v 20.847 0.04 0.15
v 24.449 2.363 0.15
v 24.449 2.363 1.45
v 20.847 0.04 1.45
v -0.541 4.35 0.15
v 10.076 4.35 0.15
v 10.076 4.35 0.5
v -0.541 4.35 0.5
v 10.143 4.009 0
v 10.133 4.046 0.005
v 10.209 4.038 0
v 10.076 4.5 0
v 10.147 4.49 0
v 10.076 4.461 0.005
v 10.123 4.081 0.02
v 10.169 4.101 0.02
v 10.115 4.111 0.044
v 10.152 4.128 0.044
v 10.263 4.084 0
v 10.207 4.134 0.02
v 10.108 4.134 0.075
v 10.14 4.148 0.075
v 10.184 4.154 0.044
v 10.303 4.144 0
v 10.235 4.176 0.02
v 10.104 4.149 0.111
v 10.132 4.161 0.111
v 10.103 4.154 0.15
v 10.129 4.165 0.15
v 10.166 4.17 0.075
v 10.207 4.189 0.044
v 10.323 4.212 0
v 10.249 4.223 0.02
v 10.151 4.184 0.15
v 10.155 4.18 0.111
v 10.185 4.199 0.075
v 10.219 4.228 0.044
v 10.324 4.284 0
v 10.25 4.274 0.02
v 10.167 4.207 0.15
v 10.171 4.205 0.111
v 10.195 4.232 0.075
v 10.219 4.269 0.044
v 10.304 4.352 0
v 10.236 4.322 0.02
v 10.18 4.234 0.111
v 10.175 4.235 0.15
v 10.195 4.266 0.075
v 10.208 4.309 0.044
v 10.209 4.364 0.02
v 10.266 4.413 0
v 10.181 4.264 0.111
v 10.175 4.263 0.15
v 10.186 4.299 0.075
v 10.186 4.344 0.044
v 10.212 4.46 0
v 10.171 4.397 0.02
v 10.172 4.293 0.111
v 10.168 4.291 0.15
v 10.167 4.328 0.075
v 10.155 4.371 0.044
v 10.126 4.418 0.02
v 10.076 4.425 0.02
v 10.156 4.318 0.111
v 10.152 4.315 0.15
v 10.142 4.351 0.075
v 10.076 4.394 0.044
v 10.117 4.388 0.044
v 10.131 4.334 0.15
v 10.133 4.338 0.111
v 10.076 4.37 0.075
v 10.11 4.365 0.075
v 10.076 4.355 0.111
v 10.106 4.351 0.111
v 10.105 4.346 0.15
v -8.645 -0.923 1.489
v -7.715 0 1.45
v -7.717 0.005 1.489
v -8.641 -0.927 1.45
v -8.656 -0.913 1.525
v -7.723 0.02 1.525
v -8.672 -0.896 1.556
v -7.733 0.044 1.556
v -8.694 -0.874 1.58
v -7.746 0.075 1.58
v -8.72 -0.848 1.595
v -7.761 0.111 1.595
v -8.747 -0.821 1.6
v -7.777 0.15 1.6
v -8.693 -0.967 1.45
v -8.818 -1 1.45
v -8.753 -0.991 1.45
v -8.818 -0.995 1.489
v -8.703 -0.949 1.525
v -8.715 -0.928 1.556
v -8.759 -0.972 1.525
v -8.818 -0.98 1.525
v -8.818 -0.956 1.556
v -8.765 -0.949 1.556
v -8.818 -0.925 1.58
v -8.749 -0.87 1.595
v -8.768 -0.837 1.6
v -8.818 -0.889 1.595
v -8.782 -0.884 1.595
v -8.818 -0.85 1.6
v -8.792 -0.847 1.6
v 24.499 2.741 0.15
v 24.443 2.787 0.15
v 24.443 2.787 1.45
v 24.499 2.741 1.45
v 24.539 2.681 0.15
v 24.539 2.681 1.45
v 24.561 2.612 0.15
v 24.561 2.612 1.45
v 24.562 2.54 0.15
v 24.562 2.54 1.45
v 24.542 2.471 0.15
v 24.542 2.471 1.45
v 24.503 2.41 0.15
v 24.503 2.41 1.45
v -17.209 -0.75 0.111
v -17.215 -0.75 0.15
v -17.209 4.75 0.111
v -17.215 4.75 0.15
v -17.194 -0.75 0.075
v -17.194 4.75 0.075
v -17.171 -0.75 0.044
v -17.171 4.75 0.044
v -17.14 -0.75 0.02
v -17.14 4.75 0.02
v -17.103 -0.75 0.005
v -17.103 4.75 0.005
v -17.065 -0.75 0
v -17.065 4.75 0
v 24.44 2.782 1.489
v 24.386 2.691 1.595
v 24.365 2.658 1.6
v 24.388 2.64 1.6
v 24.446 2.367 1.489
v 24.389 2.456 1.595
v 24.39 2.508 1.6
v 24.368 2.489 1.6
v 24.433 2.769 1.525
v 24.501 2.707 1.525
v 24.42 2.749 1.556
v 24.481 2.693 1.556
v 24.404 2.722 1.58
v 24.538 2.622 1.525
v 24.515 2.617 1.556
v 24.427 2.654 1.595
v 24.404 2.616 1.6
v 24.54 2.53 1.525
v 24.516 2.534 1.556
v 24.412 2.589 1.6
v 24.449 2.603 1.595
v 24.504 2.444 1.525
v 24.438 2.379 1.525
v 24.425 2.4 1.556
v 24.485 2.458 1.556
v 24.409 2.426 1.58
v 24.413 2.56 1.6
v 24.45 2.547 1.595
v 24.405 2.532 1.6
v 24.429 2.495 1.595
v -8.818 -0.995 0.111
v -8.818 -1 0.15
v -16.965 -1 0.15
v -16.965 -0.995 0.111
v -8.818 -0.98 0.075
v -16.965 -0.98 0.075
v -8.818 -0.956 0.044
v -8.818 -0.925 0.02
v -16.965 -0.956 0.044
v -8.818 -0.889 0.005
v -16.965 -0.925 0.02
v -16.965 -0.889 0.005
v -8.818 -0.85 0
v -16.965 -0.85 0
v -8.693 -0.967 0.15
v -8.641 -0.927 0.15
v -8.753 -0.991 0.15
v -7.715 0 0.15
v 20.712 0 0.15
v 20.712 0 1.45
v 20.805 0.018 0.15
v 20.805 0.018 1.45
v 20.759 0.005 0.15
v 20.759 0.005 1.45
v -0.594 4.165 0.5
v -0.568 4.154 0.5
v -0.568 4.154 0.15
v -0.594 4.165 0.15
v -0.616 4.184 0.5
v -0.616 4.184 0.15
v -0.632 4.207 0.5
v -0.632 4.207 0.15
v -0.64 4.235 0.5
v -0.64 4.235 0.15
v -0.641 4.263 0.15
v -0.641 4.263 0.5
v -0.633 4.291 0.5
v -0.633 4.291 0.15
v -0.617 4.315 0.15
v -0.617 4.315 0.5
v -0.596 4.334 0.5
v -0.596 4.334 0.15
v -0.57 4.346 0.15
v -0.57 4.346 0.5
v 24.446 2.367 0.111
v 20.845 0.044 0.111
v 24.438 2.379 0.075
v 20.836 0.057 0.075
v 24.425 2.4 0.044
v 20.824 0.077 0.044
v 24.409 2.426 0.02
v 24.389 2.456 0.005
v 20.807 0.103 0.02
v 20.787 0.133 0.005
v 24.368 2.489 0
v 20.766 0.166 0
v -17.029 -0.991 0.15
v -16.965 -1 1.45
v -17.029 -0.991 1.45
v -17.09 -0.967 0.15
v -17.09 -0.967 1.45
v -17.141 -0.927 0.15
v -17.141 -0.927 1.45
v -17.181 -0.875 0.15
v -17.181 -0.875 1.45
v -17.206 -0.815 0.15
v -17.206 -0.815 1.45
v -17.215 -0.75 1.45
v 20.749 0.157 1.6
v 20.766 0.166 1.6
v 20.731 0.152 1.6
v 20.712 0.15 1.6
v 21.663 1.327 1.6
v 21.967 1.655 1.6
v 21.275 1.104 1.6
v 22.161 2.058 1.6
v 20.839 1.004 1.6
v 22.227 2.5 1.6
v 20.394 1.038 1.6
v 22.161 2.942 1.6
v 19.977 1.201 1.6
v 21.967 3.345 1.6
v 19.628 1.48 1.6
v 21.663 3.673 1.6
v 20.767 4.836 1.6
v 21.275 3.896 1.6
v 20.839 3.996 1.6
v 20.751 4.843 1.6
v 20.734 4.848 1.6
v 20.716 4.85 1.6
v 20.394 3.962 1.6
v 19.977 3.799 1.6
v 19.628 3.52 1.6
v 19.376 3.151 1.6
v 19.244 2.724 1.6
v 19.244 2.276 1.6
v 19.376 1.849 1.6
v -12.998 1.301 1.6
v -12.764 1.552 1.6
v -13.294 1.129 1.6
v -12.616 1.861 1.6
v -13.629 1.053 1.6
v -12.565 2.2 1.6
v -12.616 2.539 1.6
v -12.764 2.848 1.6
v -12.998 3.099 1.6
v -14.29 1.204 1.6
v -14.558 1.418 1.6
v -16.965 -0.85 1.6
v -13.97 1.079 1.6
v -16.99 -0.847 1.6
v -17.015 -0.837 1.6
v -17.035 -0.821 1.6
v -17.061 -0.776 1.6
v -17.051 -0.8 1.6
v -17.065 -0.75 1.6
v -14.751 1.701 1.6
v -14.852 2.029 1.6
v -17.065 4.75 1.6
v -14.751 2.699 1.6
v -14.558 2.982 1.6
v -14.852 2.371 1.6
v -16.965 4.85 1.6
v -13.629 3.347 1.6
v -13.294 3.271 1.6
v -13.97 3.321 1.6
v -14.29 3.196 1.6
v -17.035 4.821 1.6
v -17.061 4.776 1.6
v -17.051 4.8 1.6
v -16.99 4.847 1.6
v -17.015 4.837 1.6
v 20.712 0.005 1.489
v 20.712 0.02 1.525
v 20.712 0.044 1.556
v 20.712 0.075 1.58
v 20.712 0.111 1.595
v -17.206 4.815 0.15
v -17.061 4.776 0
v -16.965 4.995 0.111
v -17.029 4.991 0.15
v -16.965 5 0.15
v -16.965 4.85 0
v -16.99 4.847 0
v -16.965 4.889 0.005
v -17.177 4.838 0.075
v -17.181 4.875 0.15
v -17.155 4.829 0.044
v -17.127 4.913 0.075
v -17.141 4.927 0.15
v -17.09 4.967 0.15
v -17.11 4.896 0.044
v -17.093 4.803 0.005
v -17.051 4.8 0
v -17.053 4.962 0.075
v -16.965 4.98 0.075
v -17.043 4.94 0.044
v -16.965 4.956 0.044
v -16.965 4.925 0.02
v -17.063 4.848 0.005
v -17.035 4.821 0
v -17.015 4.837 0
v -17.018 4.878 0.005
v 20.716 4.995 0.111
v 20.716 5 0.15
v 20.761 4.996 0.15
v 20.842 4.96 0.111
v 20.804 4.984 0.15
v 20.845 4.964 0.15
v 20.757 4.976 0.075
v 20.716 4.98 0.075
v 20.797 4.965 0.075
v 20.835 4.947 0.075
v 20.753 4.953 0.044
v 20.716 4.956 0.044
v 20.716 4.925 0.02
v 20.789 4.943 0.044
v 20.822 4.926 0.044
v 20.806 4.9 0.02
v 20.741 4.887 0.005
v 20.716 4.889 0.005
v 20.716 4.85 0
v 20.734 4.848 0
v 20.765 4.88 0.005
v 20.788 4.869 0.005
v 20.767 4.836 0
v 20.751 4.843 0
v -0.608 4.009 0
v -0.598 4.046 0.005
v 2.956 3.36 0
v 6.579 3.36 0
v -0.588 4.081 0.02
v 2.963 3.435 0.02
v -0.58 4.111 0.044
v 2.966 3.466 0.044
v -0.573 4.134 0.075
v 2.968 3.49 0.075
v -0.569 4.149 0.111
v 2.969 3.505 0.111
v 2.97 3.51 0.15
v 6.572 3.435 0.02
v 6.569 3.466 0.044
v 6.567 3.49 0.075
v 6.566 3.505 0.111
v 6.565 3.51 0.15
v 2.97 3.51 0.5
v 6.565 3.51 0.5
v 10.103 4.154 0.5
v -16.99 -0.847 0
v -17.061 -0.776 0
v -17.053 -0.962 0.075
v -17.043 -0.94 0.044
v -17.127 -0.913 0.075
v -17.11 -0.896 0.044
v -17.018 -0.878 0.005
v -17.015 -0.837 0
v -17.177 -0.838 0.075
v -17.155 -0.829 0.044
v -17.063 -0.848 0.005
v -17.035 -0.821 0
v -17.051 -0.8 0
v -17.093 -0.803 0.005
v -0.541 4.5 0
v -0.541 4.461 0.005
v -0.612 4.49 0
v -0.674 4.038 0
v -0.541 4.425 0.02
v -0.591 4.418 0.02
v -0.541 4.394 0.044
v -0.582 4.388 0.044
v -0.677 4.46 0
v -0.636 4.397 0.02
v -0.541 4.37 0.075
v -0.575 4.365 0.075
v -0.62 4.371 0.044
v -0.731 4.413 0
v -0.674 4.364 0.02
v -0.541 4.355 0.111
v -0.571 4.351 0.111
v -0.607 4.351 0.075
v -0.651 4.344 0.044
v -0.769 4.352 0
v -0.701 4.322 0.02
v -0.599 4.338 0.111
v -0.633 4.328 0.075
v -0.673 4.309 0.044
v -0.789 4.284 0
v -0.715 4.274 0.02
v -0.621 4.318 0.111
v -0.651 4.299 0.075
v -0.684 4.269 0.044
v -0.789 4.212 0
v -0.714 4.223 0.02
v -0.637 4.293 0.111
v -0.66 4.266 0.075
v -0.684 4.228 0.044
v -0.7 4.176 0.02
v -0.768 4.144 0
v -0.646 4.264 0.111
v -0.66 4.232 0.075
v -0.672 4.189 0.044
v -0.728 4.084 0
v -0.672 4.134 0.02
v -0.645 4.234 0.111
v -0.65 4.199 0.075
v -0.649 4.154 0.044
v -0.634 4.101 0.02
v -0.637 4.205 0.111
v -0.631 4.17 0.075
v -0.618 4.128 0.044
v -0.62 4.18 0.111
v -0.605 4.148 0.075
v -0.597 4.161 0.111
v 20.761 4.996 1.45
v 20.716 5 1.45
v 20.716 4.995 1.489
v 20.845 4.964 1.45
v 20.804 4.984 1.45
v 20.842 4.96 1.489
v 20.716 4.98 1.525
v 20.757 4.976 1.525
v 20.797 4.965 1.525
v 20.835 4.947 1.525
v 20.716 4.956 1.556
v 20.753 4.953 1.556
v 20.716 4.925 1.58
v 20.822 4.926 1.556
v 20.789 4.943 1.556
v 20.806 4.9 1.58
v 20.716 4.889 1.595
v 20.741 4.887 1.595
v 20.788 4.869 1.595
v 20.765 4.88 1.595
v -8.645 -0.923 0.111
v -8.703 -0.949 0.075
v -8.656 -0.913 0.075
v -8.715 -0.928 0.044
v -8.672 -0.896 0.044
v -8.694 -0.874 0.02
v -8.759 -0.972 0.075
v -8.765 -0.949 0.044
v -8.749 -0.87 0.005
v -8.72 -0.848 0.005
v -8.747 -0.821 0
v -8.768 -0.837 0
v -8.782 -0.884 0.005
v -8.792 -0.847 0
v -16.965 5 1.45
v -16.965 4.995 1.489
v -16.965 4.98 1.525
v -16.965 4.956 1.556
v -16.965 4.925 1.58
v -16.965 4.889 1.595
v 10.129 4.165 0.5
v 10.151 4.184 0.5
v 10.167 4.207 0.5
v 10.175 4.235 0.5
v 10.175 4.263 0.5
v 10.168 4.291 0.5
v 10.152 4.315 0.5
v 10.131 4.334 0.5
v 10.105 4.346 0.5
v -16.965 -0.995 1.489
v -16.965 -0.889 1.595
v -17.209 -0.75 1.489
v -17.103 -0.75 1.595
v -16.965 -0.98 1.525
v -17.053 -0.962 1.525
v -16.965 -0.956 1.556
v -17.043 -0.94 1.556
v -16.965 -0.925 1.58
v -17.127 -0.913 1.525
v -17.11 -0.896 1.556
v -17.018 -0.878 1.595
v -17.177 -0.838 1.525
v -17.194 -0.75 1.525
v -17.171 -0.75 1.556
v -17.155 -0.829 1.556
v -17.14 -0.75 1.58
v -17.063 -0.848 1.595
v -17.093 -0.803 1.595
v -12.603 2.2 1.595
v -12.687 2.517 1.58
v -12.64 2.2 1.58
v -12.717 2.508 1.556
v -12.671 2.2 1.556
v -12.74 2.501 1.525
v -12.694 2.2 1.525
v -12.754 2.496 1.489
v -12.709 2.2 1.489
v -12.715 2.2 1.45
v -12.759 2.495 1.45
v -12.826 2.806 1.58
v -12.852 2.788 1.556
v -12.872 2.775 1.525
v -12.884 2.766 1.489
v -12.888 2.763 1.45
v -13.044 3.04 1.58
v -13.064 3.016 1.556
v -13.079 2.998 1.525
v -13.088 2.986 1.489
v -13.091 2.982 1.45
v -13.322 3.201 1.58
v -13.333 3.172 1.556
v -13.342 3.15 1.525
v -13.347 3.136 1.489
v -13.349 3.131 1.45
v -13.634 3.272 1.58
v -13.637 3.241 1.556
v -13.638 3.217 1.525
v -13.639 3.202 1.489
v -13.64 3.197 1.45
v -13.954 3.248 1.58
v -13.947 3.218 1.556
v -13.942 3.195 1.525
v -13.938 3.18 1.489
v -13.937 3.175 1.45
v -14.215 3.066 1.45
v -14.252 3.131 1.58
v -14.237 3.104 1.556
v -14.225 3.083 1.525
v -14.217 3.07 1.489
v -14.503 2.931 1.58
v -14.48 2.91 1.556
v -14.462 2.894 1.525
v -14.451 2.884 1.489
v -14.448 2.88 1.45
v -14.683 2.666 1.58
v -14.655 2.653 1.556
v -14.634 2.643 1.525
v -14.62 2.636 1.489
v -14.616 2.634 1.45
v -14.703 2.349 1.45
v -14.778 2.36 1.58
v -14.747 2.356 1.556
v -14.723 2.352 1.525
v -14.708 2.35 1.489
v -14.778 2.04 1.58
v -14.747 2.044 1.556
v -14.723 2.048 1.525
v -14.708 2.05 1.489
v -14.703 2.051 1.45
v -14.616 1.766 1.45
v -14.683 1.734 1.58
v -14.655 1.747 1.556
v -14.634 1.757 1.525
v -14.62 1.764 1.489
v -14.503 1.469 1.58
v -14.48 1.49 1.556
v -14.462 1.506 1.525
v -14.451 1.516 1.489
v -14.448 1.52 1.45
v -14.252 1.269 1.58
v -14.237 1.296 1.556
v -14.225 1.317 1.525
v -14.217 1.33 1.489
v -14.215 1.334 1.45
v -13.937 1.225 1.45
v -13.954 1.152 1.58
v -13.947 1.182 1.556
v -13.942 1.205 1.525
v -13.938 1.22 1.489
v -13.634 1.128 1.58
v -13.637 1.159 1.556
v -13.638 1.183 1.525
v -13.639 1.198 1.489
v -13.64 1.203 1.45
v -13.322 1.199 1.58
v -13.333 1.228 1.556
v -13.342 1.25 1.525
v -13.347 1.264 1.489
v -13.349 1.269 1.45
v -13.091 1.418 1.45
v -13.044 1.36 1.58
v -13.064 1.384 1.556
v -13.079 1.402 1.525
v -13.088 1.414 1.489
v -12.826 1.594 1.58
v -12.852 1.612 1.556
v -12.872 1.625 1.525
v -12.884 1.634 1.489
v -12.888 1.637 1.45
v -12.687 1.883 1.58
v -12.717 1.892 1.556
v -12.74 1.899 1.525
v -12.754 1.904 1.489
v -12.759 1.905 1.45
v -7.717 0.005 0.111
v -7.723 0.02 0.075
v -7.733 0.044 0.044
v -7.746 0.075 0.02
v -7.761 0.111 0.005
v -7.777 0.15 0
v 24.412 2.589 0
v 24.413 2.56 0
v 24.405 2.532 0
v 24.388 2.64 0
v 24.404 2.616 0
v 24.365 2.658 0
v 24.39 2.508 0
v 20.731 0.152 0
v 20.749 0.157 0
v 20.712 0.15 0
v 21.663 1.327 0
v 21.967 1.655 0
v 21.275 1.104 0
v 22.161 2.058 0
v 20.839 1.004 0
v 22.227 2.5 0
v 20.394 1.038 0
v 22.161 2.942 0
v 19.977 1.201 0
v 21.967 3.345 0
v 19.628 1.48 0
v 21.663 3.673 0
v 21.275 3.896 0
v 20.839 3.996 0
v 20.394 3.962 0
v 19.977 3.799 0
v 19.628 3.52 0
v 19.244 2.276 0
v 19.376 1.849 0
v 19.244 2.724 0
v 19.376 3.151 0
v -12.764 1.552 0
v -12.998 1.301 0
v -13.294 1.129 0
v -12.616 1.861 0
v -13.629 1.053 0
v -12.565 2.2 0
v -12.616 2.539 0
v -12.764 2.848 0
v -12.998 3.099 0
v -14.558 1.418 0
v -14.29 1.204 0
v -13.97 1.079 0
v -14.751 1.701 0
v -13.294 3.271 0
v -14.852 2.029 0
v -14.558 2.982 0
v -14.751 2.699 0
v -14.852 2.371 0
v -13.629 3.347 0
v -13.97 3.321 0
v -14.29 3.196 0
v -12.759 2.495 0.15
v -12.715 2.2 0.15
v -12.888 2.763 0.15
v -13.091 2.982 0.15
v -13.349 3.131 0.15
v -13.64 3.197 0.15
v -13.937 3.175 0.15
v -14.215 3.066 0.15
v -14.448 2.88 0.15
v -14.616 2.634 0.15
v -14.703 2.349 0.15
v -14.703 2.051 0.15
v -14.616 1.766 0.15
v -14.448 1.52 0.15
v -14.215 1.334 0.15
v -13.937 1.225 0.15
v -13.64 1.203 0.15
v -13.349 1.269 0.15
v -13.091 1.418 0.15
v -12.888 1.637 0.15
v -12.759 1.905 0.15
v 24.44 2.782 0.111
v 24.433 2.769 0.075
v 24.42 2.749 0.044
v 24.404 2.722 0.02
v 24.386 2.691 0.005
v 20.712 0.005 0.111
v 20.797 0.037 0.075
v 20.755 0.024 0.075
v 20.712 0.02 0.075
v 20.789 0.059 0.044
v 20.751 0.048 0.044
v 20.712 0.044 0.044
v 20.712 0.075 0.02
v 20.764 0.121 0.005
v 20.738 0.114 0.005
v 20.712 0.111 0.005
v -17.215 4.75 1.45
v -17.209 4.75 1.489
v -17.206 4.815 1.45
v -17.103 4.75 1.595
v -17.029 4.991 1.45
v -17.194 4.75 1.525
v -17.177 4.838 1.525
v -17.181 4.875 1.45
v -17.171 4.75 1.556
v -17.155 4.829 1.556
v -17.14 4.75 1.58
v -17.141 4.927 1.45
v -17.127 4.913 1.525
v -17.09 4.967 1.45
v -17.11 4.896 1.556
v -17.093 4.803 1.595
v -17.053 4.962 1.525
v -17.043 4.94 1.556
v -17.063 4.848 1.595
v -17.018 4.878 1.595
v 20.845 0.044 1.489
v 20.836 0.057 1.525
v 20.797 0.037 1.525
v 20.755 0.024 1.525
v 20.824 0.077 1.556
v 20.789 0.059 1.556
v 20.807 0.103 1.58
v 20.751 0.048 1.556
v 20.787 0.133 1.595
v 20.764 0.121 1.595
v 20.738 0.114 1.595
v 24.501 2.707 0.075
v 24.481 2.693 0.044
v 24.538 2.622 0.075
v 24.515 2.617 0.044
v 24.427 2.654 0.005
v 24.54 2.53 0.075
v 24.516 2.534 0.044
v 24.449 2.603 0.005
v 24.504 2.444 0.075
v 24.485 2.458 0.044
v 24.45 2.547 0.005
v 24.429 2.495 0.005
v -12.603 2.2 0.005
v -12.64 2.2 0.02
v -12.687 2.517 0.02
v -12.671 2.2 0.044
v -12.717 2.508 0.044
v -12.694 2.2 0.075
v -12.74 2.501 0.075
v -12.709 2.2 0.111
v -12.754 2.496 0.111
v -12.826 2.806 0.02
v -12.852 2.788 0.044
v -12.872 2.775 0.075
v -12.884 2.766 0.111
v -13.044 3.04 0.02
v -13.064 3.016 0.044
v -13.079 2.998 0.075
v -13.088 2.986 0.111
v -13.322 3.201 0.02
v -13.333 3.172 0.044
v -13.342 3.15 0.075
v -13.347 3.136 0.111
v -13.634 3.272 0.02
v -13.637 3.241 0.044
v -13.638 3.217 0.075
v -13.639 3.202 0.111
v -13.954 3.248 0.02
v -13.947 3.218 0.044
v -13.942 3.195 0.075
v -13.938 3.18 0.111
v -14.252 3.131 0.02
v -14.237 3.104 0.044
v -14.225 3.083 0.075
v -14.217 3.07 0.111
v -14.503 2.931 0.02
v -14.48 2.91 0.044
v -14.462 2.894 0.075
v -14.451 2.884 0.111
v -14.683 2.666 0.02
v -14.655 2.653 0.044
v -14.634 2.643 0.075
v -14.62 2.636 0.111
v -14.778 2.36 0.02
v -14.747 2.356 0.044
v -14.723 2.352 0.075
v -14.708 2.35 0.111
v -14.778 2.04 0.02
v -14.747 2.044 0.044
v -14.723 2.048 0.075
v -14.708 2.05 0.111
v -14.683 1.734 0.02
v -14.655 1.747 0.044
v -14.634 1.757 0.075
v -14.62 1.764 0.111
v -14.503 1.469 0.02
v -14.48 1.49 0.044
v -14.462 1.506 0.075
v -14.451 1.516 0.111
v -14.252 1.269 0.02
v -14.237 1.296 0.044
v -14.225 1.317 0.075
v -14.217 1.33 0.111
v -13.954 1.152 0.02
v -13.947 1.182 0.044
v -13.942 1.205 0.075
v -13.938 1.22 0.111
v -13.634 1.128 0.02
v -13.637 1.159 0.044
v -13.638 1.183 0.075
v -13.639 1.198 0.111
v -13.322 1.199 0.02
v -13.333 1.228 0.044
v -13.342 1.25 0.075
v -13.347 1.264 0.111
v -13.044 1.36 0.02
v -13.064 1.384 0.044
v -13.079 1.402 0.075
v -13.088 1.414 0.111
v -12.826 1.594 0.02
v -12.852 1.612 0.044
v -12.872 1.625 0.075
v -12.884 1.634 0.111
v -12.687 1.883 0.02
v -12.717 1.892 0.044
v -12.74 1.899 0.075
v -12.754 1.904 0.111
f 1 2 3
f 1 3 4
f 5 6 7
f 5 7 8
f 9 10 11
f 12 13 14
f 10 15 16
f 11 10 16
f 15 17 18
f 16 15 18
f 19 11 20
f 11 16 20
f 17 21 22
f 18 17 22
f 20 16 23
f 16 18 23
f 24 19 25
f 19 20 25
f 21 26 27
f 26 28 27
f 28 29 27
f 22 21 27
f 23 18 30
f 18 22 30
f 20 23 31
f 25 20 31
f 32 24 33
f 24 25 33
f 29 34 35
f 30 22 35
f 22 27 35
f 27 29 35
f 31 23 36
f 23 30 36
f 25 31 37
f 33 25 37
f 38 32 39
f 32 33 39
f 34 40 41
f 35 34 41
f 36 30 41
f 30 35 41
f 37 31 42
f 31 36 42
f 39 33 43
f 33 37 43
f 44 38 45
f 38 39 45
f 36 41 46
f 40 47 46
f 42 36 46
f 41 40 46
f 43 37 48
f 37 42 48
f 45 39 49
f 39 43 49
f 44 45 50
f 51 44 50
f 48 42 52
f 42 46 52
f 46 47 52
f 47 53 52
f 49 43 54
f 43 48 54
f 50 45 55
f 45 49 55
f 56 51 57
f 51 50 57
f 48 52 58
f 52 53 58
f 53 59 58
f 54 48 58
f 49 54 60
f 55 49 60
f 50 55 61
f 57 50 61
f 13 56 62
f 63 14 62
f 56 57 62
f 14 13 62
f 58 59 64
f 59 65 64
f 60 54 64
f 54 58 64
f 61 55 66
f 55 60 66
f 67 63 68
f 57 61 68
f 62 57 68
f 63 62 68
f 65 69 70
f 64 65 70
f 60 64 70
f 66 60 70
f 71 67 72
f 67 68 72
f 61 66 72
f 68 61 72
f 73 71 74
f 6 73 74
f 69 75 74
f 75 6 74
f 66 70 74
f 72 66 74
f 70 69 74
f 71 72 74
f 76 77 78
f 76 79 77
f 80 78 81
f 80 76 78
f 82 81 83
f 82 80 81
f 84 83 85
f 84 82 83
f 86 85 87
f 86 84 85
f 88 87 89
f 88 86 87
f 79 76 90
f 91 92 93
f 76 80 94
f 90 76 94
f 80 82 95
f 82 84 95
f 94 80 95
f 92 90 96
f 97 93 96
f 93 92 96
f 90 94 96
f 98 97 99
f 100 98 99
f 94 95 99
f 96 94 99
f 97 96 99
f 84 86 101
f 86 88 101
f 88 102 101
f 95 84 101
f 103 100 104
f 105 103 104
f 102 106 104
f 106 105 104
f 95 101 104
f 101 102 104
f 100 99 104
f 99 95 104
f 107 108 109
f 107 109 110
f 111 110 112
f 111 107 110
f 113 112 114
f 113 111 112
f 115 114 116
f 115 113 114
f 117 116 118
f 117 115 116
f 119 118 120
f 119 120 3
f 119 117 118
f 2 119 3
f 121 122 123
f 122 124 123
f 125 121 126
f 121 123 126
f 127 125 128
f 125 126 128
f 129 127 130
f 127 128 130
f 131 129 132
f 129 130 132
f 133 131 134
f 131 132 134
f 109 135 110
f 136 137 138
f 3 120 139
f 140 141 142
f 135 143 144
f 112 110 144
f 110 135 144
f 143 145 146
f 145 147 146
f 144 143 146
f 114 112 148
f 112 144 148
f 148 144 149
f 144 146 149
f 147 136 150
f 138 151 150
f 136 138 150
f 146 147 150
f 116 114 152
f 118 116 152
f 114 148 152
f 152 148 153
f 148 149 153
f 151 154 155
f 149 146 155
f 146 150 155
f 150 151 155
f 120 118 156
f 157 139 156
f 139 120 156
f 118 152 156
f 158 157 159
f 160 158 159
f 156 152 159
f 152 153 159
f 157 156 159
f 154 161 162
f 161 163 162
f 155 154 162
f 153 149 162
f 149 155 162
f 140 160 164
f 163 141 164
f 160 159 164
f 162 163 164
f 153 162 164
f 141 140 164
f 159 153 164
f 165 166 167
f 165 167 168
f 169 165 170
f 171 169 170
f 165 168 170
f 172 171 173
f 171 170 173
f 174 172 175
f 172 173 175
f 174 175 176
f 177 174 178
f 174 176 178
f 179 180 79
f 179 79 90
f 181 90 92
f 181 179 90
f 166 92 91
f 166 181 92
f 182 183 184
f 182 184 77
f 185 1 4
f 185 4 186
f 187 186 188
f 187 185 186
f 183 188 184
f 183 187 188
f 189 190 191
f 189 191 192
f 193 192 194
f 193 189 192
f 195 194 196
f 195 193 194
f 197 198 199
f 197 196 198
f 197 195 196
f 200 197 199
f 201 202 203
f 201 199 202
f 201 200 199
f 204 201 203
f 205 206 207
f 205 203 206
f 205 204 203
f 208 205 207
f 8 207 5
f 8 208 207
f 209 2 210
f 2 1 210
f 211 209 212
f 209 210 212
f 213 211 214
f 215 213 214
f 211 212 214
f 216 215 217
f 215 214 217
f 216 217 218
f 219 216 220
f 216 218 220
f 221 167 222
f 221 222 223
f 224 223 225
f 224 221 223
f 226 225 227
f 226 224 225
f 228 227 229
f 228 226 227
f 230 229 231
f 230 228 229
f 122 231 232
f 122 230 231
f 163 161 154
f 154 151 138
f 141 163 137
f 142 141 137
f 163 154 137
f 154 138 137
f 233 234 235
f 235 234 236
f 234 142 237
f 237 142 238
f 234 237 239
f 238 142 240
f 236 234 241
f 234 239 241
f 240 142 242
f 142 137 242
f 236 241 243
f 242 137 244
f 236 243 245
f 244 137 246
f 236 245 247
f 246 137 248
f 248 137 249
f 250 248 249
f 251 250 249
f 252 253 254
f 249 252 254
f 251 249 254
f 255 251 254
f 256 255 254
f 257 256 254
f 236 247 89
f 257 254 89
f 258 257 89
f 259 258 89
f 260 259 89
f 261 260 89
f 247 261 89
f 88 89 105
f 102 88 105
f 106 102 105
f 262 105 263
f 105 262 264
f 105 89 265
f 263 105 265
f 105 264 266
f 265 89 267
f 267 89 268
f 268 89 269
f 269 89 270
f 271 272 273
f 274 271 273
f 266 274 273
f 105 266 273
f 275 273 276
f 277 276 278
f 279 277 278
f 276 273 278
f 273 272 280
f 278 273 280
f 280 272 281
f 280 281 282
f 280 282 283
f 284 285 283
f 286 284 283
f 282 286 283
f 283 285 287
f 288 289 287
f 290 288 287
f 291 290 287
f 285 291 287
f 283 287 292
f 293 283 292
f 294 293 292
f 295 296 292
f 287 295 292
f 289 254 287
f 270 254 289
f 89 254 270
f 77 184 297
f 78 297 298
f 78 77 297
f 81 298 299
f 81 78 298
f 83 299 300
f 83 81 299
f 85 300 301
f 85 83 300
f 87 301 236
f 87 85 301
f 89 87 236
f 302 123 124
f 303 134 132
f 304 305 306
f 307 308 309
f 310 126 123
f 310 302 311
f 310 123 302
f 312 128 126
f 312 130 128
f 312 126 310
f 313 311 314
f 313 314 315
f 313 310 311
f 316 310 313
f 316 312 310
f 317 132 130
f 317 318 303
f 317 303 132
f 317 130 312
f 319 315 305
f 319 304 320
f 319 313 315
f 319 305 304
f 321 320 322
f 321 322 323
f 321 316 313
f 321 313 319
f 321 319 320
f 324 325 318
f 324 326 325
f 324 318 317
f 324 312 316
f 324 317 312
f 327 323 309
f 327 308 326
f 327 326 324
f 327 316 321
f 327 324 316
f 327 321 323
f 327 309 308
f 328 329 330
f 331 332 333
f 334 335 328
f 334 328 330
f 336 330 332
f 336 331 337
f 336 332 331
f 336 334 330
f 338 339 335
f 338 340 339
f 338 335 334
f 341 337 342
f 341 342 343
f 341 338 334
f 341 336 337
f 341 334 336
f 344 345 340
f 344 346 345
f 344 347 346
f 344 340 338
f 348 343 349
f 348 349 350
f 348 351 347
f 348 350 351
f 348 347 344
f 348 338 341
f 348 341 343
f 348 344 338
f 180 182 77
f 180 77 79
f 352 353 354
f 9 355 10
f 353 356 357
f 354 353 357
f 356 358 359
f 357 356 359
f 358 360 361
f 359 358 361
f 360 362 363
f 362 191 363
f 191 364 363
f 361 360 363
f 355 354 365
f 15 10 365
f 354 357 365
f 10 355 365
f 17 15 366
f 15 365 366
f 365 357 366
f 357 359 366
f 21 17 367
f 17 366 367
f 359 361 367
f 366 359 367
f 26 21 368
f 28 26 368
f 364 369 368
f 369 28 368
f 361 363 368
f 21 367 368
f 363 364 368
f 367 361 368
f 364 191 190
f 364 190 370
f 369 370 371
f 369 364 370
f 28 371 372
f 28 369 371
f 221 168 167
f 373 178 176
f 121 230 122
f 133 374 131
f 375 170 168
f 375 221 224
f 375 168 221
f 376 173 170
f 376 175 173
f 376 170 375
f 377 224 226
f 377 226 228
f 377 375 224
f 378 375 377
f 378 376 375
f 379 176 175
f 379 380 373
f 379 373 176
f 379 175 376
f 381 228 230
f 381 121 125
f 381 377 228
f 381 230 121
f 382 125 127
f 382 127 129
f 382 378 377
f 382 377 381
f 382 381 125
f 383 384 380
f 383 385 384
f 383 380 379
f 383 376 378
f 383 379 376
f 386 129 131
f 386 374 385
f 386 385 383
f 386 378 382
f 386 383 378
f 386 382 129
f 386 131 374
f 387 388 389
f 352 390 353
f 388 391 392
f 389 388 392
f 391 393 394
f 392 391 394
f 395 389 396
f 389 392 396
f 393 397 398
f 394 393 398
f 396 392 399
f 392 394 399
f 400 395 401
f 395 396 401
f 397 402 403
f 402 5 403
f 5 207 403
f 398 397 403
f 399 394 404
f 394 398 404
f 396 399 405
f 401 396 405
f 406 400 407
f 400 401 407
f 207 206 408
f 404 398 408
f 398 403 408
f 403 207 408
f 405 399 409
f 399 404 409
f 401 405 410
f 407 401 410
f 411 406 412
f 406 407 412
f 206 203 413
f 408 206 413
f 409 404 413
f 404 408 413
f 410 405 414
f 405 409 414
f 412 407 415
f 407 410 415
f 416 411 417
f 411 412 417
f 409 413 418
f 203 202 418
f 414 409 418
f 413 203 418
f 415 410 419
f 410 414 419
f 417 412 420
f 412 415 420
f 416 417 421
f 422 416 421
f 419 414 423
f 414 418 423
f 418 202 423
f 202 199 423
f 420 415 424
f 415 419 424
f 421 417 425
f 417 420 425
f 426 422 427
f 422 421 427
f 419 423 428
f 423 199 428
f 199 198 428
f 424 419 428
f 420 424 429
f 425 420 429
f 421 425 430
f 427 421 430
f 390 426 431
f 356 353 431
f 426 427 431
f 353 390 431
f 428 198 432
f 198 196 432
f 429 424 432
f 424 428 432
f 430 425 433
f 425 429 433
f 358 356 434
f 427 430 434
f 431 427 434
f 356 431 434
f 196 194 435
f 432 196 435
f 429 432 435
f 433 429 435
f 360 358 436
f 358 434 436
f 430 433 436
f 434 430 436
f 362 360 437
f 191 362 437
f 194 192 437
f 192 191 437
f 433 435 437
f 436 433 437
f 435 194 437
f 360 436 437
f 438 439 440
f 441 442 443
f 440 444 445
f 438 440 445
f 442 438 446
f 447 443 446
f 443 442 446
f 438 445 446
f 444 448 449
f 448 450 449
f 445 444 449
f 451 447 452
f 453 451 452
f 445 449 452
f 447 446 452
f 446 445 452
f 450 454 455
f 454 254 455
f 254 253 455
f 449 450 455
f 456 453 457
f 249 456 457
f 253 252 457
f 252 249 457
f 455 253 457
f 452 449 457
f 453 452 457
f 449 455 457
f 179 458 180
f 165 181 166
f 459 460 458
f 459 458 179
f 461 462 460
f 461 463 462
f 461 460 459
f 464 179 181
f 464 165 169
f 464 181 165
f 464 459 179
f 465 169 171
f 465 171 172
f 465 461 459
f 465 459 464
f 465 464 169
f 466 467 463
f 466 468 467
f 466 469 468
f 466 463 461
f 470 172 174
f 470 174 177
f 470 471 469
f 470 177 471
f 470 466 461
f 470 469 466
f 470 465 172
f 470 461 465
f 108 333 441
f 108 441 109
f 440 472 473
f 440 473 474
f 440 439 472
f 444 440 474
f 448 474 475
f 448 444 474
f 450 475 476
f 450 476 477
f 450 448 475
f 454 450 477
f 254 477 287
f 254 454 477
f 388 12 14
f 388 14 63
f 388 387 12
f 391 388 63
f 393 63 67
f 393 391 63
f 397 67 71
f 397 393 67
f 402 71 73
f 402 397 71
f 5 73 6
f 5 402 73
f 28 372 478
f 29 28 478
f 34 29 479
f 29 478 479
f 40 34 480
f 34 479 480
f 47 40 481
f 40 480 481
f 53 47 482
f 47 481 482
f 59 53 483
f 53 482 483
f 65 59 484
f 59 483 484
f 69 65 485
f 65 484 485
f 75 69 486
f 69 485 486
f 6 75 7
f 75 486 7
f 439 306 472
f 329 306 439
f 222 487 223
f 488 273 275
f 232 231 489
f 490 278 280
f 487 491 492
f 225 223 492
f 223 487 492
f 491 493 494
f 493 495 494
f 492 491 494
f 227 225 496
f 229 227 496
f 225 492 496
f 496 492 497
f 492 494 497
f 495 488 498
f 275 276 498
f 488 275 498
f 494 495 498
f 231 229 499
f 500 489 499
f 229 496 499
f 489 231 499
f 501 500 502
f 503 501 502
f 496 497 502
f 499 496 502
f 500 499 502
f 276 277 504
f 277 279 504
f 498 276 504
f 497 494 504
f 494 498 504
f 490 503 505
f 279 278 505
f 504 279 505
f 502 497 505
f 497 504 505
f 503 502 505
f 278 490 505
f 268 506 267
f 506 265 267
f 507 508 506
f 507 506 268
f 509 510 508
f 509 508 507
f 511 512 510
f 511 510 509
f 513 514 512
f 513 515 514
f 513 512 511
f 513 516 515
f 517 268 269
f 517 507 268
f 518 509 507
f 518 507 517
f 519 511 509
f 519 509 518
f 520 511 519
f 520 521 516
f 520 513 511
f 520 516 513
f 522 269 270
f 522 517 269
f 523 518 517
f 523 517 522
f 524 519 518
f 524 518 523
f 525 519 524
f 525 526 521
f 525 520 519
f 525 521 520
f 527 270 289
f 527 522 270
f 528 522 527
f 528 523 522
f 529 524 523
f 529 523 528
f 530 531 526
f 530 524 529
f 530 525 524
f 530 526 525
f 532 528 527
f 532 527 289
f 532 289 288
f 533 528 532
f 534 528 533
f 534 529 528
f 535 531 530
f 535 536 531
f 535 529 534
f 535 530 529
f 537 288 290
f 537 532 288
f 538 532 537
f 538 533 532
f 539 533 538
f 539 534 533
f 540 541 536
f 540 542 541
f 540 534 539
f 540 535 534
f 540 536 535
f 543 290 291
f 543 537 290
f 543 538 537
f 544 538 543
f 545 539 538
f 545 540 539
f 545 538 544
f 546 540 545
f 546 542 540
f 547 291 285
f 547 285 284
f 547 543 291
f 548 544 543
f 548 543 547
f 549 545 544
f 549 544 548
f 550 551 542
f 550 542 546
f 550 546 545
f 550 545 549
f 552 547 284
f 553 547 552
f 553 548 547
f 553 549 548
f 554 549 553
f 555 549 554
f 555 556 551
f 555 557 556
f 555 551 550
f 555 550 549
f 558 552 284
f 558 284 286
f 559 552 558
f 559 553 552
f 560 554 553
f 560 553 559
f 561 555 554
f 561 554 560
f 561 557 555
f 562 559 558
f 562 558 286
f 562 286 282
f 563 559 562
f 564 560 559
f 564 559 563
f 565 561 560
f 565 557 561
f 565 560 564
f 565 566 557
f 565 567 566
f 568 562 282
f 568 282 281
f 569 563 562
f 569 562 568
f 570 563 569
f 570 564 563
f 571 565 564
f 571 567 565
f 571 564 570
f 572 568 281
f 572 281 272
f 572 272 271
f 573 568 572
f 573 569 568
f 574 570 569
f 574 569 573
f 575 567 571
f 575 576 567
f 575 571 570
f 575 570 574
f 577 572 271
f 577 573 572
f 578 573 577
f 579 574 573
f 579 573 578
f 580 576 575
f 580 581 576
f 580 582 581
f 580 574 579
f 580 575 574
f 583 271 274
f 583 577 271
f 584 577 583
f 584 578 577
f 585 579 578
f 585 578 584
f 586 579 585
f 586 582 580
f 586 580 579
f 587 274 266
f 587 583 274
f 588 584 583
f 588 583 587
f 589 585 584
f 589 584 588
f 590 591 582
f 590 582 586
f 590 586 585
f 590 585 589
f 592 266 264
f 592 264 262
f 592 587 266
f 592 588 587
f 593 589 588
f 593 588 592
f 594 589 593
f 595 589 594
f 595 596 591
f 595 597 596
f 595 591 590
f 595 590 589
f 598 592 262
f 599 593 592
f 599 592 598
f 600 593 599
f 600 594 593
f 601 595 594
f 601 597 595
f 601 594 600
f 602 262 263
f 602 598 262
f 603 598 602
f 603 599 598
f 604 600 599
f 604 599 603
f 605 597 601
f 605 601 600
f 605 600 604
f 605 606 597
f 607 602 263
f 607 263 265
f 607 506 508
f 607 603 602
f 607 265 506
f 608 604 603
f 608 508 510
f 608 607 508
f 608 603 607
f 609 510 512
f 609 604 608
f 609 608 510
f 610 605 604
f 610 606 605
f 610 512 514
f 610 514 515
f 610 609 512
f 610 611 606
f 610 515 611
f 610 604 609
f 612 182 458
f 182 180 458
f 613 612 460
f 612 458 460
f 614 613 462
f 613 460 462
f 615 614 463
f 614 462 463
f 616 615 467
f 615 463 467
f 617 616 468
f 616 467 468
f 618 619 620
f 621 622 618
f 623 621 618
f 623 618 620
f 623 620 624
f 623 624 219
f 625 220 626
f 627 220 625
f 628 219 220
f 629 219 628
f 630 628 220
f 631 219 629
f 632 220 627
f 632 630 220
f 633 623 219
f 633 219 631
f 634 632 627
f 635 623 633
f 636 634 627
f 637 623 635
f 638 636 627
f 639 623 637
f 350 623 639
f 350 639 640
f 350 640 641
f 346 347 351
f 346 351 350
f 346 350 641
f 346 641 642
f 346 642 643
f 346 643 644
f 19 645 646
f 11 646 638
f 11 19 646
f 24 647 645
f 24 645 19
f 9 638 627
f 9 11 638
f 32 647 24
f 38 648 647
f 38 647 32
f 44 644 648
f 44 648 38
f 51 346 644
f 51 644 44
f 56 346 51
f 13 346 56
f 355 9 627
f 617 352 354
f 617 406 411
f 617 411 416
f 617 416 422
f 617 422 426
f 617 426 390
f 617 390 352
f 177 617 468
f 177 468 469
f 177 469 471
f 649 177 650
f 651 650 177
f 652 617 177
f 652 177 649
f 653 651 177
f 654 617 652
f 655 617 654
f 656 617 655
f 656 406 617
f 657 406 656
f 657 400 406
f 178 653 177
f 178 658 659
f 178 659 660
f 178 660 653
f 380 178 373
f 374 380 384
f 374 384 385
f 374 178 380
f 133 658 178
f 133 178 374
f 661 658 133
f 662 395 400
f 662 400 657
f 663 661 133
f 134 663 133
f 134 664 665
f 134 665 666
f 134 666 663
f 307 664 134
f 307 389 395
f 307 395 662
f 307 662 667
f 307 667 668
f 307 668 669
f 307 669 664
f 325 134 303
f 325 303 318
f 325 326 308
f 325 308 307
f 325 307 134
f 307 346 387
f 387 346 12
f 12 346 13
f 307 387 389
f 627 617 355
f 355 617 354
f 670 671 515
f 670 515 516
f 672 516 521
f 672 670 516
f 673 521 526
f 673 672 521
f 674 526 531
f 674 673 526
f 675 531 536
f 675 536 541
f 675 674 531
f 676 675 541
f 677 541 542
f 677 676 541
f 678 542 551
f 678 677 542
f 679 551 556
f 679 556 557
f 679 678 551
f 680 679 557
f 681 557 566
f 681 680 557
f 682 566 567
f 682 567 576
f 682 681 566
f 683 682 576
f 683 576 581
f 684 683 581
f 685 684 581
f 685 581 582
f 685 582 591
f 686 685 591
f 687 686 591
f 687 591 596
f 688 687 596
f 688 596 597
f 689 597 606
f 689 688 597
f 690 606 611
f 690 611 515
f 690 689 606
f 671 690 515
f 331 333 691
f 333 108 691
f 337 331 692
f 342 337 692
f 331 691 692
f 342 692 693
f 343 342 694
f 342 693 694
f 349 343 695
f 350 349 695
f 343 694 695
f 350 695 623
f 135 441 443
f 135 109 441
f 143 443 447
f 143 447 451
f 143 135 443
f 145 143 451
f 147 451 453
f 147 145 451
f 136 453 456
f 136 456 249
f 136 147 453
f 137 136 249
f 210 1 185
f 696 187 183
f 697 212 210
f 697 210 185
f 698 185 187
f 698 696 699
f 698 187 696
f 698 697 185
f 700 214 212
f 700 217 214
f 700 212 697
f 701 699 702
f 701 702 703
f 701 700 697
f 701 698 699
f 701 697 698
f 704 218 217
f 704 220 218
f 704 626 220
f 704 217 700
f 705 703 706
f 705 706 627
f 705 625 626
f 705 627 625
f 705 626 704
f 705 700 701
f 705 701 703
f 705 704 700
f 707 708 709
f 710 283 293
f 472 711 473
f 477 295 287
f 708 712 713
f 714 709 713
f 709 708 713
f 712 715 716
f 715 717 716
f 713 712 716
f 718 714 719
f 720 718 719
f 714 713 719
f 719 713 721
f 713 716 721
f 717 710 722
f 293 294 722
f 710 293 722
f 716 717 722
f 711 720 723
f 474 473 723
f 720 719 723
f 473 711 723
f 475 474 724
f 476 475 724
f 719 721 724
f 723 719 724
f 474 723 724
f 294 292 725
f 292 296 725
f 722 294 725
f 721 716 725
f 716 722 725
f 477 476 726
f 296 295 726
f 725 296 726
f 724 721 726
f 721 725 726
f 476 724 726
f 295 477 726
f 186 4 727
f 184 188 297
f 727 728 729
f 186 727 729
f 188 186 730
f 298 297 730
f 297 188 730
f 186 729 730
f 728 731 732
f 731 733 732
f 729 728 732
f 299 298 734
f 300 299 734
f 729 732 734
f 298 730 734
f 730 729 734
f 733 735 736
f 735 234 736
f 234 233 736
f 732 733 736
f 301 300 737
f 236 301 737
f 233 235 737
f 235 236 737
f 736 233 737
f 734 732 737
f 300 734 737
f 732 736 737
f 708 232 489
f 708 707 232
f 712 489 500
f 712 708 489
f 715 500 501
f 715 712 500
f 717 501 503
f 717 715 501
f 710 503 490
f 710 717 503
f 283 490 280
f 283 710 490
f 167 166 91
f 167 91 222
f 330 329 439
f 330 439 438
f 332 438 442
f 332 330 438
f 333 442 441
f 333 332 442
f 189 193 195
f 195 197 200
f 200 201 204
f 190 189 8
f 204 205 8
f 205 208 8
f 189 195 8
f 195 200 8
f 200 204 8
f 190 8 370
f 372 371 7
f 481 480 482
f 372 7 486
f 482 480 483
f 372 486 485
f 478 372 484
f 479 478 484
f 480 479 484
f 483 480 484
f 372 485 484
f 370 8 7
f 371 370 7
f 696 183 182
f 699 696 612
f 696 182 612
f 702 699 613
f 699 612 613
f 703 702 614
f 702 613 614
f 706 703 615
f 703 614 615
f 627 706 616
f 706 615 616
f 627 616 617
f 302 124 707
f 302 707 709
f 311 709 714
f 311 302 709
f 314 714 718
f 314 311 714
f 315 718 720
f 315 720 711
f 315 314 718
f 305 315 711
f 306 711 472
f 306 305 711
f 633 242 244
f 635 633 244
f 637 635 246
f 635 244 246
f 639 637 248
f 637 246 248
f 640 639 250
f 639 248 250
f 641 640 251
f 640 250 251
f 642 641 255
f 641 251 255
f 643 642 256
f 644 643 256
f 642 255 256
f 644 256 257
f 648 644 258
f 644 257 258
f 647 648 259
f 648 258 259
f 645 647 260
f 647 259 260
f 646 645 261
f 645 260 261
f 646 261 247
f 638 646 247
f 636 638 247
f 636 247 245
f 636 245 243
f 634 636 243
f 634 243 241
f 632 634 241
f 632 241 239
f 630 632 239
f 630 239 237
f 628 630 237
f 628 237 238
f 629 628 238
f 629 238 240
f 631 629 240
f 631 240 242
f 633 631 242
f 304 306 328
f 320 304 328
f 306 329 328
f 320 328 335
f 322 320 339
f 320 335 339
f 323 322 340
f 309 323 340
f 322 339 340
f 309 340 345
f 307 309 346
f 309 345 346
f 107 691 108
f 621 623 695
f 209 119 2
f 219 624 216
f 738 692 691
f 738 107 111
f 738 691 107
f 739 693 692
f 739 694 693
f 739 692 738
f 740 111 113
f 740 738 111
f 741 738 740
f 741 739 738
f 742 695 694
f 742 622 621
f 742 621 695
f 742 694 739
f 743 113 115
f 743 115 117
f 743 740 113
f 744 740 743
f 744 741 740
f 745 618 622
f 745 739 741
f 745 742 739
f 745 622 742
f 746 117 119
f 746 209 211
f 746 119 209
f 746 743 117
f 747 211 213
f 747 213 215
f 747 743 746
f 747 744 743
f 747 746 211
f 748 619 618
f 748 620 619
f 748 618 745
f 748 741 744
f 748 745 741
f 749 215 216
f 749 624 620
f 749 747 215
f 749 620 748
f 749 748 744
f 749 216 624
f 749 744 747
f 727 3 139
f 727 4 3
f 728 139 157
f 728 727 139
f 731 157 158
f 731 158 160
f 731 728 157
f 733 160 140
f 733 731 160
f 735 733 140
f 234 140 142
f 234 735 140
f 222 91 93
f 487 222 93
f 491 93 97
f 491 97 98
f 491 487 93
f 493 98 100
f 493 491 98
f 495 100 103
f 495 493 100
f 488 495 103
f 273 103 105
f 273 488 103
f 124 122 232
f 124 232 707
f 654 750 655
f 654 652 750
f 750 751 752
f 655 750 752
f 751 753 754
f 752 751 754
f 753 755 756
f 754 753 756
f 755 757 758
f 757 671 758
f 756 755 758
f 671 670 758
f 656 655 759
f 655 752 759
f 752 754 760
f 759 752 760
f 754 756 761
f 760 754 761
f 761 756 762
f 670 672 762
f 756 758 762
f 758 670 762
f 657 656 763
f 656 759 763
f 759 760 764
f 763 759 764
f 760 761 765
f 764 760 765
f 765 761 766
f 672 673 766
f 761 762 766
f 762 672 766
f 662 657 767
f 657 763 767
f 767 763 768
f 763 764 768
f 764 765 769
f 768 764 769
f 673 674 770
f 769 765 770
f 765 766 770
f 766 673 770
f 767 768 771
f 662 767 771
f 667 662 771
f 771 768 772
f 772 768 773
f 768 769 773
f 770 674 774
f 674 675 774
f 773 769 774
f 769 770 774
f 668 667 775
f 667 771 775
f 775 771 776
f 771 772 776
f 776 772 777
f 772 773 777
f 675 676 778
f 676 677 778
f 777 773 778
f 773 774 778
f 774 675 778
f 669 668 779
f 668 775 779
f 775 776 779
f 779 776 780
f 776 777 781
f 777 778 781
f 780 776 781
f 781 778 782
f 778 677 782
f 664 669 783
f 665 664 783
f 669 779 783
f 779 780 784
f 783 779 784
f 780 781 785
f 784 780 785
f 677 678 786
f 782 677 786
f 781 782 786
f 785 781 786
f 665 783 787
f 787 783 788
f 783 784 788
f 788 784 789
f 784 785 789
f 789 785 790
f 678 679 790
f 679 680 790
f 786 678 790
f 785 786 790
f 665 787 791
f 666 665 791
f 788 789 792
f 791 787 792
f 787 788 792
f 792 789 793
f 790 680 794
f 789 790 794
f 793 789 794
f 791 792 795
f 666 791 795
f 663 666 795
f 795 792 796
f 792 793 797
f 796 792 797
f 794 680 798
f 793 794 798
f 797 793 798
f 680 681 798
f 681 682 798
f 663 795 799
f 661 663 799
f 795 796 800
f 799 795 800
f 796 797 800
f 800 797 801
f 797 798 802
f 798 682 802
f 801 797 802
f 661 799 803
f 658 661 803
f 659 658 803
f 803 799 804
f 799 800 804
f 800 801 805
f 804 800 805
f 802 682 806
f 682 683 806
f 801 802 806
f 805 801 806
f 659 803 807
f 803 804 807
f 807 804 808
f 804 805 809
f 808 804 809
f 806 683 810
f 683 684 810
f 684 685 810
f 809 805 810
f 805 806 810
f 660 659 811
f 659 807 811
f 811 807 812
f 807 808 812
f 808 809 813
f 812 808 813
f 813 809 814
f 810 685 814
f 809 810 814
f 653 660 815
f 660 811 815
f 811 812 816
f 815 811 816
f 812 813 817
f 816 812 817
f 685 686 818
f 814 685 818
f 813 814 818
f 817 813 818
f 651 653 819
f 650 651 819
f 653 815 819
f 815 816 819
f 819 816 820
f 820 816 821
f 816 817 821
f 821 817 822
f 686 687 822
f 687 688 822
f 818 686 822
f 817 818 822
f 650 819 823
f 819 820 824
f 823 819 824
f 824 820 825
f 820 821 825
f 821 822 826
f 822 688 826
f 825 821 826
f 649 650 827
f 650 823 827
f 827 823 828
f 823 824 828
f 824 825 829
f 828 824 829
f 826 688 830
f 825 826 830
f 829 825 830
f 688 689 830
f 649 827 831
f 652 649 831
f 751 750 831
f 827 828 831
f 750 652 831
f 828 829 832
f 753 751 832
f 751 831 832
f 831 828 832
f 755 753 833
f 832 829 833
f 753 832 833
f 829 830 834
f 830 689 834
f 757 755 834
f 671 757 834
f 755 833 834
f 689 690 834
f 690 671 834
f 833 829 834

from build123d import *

# Parameters (mm, degrees)
SKETCH1_R           = 1
BOSS_EXTRUDE1_DEPTH = 1.6
FILLET1_R           = 0.15
SKETCH2_R           = 1.5
CUT_EXTRUDE1_DEPTH  = 26.118429106
FILLET2_R           = 0.15
CUT_EXTRUDE2_DEPTH  = 0.5
FILLET3_R           = 0.1
FILLET4_R           = 0.15


with BuildPart() as part:
    # Sketch1 → Boss-Extrude1 (new body)
    with BuildSketch(Plane.XY):
        with BuildLine():
            Line((20.711831818, 0), (-7.714550435, 0))
            Line((-7.714550435, 0), (-8.64132713, -0.926776695))
            ThreePointArc((-8.64132713, -0.926776695), (-8.722432968, -0.980969883), (-8.818103826, -1))
            Line((-8.818103826, -1), (-16.964550435, -1))
            ThreePointArc((-16.964550435, -1), (-17.14132713, -0.926776695), (-17.214550435, -0.75))
            Line((-17.214550435, -0.75), (-17.214550435, 4.75))
            ThreePointArc((-17.214550435, 4.75), (-17.14132713, 4.926776695), (-16.964550435, 5))
            Line((-16.964550435, 5), (20.715695772, 5))
            ThreePointArc((20.715695772, 5), (20.782883317, 4.990802479), (20.845127191, 4.96388667))
            Line((20.845127191, 4.96388667), (24.443133824, 2.786588264))
            ThreePointArc((24.443133824, 2.786588264), (24.56367691, 2.576271817), (24.449189394, 2.362598581))
            Line((24.449189394, 2.362598581), (20.847318807, 0.039896988))
            ThreePointArc((20.847318807, 0.039896988), (20.782451386, 0.010181576), (20.711831818, 0))
        make_face()
        with Locations((-13.714550435, 2.2)):
            Circle(SKETCH1_R, mode=Mode.SUBTRACT)
    extrude(amount=BOSS_EXTRUDE1_DEPTH)

    # Fillet1
    fillet1_edges = [part.edges().sort_by_distance(p)[0] for p in [
        (20.782451386, 0.010181576, 1.6),
        (-8.722432968, -0.980969883, 0),
        (-12.89132713, -1, 0),
        (-17.14132713, -0.926776695, 0),
        (-17.214550435, 2, 0),
        (-17.14132713, 4.926776695, 0),
        (1.875572668, 5, 0),
        (20.782883317, 4.990802479, 0),
        (22.644130508, 3.875237467, 0),
        (24.56367691, 2.576271817, 0),
        (22.6482541, 1.201247785, 0),
        (22.6482541, 1.201247785, 1.6),
        (20.782451386, 0.010181576, 0),
        (6.498640691, 0, 0),
        (-8.177938783, -0.463388348, 0),
        (24.56367691, 2.576271817, 1.6),
        (22.644130508, 3.875237467, 1.6),
        (20.782883317, 4.990802479, 1.6),
        (1.875572668, 5, 1.6),
        (-17.14132713, 4.926776695, 1.6),
        (-17.214550435, 2, 1.6),
        (-17.14132713, -0.926776695, 1.6),
        (-12.89132713, -1, 1.6),
        (-8.177938783, -0.463388348, 1.6),
        (-8.722432968, -0.980969883, 1.6),
        (6.498640691, 0, 1.6),
    ]]
    fillet(fillet1_edges, radius=FILLET1_R)

    # Sketch2 → Cut-Extrude1 (cut, through all)
    with BuildSketch(Plane.XY.offset(1.6)):
        with Locations((20.727351555, 2.5)):
            Circle(SKETCH2_R)
    extrude(amount=-CUT_EXTRUDE1_DEPTH, mode=Mode.SUBTRACT)

    # Fillet2
    fillet2_edges = [part.edges().sort_by_distance(p)[0] for p in [
        (-14.714550435, 2.2, 0),
        (-14.714550435, 2.2, 1.6),
    ]]
    fillet(fillet2_edges, radius=FILLET2_R)

    # Sketch3 → Cut-Extrude2 (cut)
    with BuildSketch(Plane(origin=(0, 0, 0), x_dir=(-1, 0, 0), z_dir=(0, 0, -1))):
        with BuildLine():
            Line((-10.767468339, 4.35), (1.232531661, 4.35))
            ThreePointArc((1.232531661, 4.35), (-4.767468339, 3.428784028), (-10.767468339, 4.35))
        make_face()
    extrude(amount=-CUT_EXTRUDE2_DEPTH, mode=Mode.SUBTRACT)

    # Fillet3
    fillet3_edges = [part.edges().sort_by_distance(p)[0] for p in [
        (-1.232531661, 4.35, 0.25),
        (10.767468339, 4.35, 0.25),
    ]]
    fillet(fillet3_edges, radius=FILLET3_R)

    # Fillet4
    fillet4_edges = [part.edges().sort_by_distance(p)[0] for p in [
        (4.767468339, 3.428784028, 0),
        (4.767468339, 4.35, 0),
        (10.17544157, 4.263461428, 0),
        (-0.640504891, 4.263461428, 0),
    ]]
    fillet(fillet4_edges, radius=FILLET4_R)


solid = part.part
